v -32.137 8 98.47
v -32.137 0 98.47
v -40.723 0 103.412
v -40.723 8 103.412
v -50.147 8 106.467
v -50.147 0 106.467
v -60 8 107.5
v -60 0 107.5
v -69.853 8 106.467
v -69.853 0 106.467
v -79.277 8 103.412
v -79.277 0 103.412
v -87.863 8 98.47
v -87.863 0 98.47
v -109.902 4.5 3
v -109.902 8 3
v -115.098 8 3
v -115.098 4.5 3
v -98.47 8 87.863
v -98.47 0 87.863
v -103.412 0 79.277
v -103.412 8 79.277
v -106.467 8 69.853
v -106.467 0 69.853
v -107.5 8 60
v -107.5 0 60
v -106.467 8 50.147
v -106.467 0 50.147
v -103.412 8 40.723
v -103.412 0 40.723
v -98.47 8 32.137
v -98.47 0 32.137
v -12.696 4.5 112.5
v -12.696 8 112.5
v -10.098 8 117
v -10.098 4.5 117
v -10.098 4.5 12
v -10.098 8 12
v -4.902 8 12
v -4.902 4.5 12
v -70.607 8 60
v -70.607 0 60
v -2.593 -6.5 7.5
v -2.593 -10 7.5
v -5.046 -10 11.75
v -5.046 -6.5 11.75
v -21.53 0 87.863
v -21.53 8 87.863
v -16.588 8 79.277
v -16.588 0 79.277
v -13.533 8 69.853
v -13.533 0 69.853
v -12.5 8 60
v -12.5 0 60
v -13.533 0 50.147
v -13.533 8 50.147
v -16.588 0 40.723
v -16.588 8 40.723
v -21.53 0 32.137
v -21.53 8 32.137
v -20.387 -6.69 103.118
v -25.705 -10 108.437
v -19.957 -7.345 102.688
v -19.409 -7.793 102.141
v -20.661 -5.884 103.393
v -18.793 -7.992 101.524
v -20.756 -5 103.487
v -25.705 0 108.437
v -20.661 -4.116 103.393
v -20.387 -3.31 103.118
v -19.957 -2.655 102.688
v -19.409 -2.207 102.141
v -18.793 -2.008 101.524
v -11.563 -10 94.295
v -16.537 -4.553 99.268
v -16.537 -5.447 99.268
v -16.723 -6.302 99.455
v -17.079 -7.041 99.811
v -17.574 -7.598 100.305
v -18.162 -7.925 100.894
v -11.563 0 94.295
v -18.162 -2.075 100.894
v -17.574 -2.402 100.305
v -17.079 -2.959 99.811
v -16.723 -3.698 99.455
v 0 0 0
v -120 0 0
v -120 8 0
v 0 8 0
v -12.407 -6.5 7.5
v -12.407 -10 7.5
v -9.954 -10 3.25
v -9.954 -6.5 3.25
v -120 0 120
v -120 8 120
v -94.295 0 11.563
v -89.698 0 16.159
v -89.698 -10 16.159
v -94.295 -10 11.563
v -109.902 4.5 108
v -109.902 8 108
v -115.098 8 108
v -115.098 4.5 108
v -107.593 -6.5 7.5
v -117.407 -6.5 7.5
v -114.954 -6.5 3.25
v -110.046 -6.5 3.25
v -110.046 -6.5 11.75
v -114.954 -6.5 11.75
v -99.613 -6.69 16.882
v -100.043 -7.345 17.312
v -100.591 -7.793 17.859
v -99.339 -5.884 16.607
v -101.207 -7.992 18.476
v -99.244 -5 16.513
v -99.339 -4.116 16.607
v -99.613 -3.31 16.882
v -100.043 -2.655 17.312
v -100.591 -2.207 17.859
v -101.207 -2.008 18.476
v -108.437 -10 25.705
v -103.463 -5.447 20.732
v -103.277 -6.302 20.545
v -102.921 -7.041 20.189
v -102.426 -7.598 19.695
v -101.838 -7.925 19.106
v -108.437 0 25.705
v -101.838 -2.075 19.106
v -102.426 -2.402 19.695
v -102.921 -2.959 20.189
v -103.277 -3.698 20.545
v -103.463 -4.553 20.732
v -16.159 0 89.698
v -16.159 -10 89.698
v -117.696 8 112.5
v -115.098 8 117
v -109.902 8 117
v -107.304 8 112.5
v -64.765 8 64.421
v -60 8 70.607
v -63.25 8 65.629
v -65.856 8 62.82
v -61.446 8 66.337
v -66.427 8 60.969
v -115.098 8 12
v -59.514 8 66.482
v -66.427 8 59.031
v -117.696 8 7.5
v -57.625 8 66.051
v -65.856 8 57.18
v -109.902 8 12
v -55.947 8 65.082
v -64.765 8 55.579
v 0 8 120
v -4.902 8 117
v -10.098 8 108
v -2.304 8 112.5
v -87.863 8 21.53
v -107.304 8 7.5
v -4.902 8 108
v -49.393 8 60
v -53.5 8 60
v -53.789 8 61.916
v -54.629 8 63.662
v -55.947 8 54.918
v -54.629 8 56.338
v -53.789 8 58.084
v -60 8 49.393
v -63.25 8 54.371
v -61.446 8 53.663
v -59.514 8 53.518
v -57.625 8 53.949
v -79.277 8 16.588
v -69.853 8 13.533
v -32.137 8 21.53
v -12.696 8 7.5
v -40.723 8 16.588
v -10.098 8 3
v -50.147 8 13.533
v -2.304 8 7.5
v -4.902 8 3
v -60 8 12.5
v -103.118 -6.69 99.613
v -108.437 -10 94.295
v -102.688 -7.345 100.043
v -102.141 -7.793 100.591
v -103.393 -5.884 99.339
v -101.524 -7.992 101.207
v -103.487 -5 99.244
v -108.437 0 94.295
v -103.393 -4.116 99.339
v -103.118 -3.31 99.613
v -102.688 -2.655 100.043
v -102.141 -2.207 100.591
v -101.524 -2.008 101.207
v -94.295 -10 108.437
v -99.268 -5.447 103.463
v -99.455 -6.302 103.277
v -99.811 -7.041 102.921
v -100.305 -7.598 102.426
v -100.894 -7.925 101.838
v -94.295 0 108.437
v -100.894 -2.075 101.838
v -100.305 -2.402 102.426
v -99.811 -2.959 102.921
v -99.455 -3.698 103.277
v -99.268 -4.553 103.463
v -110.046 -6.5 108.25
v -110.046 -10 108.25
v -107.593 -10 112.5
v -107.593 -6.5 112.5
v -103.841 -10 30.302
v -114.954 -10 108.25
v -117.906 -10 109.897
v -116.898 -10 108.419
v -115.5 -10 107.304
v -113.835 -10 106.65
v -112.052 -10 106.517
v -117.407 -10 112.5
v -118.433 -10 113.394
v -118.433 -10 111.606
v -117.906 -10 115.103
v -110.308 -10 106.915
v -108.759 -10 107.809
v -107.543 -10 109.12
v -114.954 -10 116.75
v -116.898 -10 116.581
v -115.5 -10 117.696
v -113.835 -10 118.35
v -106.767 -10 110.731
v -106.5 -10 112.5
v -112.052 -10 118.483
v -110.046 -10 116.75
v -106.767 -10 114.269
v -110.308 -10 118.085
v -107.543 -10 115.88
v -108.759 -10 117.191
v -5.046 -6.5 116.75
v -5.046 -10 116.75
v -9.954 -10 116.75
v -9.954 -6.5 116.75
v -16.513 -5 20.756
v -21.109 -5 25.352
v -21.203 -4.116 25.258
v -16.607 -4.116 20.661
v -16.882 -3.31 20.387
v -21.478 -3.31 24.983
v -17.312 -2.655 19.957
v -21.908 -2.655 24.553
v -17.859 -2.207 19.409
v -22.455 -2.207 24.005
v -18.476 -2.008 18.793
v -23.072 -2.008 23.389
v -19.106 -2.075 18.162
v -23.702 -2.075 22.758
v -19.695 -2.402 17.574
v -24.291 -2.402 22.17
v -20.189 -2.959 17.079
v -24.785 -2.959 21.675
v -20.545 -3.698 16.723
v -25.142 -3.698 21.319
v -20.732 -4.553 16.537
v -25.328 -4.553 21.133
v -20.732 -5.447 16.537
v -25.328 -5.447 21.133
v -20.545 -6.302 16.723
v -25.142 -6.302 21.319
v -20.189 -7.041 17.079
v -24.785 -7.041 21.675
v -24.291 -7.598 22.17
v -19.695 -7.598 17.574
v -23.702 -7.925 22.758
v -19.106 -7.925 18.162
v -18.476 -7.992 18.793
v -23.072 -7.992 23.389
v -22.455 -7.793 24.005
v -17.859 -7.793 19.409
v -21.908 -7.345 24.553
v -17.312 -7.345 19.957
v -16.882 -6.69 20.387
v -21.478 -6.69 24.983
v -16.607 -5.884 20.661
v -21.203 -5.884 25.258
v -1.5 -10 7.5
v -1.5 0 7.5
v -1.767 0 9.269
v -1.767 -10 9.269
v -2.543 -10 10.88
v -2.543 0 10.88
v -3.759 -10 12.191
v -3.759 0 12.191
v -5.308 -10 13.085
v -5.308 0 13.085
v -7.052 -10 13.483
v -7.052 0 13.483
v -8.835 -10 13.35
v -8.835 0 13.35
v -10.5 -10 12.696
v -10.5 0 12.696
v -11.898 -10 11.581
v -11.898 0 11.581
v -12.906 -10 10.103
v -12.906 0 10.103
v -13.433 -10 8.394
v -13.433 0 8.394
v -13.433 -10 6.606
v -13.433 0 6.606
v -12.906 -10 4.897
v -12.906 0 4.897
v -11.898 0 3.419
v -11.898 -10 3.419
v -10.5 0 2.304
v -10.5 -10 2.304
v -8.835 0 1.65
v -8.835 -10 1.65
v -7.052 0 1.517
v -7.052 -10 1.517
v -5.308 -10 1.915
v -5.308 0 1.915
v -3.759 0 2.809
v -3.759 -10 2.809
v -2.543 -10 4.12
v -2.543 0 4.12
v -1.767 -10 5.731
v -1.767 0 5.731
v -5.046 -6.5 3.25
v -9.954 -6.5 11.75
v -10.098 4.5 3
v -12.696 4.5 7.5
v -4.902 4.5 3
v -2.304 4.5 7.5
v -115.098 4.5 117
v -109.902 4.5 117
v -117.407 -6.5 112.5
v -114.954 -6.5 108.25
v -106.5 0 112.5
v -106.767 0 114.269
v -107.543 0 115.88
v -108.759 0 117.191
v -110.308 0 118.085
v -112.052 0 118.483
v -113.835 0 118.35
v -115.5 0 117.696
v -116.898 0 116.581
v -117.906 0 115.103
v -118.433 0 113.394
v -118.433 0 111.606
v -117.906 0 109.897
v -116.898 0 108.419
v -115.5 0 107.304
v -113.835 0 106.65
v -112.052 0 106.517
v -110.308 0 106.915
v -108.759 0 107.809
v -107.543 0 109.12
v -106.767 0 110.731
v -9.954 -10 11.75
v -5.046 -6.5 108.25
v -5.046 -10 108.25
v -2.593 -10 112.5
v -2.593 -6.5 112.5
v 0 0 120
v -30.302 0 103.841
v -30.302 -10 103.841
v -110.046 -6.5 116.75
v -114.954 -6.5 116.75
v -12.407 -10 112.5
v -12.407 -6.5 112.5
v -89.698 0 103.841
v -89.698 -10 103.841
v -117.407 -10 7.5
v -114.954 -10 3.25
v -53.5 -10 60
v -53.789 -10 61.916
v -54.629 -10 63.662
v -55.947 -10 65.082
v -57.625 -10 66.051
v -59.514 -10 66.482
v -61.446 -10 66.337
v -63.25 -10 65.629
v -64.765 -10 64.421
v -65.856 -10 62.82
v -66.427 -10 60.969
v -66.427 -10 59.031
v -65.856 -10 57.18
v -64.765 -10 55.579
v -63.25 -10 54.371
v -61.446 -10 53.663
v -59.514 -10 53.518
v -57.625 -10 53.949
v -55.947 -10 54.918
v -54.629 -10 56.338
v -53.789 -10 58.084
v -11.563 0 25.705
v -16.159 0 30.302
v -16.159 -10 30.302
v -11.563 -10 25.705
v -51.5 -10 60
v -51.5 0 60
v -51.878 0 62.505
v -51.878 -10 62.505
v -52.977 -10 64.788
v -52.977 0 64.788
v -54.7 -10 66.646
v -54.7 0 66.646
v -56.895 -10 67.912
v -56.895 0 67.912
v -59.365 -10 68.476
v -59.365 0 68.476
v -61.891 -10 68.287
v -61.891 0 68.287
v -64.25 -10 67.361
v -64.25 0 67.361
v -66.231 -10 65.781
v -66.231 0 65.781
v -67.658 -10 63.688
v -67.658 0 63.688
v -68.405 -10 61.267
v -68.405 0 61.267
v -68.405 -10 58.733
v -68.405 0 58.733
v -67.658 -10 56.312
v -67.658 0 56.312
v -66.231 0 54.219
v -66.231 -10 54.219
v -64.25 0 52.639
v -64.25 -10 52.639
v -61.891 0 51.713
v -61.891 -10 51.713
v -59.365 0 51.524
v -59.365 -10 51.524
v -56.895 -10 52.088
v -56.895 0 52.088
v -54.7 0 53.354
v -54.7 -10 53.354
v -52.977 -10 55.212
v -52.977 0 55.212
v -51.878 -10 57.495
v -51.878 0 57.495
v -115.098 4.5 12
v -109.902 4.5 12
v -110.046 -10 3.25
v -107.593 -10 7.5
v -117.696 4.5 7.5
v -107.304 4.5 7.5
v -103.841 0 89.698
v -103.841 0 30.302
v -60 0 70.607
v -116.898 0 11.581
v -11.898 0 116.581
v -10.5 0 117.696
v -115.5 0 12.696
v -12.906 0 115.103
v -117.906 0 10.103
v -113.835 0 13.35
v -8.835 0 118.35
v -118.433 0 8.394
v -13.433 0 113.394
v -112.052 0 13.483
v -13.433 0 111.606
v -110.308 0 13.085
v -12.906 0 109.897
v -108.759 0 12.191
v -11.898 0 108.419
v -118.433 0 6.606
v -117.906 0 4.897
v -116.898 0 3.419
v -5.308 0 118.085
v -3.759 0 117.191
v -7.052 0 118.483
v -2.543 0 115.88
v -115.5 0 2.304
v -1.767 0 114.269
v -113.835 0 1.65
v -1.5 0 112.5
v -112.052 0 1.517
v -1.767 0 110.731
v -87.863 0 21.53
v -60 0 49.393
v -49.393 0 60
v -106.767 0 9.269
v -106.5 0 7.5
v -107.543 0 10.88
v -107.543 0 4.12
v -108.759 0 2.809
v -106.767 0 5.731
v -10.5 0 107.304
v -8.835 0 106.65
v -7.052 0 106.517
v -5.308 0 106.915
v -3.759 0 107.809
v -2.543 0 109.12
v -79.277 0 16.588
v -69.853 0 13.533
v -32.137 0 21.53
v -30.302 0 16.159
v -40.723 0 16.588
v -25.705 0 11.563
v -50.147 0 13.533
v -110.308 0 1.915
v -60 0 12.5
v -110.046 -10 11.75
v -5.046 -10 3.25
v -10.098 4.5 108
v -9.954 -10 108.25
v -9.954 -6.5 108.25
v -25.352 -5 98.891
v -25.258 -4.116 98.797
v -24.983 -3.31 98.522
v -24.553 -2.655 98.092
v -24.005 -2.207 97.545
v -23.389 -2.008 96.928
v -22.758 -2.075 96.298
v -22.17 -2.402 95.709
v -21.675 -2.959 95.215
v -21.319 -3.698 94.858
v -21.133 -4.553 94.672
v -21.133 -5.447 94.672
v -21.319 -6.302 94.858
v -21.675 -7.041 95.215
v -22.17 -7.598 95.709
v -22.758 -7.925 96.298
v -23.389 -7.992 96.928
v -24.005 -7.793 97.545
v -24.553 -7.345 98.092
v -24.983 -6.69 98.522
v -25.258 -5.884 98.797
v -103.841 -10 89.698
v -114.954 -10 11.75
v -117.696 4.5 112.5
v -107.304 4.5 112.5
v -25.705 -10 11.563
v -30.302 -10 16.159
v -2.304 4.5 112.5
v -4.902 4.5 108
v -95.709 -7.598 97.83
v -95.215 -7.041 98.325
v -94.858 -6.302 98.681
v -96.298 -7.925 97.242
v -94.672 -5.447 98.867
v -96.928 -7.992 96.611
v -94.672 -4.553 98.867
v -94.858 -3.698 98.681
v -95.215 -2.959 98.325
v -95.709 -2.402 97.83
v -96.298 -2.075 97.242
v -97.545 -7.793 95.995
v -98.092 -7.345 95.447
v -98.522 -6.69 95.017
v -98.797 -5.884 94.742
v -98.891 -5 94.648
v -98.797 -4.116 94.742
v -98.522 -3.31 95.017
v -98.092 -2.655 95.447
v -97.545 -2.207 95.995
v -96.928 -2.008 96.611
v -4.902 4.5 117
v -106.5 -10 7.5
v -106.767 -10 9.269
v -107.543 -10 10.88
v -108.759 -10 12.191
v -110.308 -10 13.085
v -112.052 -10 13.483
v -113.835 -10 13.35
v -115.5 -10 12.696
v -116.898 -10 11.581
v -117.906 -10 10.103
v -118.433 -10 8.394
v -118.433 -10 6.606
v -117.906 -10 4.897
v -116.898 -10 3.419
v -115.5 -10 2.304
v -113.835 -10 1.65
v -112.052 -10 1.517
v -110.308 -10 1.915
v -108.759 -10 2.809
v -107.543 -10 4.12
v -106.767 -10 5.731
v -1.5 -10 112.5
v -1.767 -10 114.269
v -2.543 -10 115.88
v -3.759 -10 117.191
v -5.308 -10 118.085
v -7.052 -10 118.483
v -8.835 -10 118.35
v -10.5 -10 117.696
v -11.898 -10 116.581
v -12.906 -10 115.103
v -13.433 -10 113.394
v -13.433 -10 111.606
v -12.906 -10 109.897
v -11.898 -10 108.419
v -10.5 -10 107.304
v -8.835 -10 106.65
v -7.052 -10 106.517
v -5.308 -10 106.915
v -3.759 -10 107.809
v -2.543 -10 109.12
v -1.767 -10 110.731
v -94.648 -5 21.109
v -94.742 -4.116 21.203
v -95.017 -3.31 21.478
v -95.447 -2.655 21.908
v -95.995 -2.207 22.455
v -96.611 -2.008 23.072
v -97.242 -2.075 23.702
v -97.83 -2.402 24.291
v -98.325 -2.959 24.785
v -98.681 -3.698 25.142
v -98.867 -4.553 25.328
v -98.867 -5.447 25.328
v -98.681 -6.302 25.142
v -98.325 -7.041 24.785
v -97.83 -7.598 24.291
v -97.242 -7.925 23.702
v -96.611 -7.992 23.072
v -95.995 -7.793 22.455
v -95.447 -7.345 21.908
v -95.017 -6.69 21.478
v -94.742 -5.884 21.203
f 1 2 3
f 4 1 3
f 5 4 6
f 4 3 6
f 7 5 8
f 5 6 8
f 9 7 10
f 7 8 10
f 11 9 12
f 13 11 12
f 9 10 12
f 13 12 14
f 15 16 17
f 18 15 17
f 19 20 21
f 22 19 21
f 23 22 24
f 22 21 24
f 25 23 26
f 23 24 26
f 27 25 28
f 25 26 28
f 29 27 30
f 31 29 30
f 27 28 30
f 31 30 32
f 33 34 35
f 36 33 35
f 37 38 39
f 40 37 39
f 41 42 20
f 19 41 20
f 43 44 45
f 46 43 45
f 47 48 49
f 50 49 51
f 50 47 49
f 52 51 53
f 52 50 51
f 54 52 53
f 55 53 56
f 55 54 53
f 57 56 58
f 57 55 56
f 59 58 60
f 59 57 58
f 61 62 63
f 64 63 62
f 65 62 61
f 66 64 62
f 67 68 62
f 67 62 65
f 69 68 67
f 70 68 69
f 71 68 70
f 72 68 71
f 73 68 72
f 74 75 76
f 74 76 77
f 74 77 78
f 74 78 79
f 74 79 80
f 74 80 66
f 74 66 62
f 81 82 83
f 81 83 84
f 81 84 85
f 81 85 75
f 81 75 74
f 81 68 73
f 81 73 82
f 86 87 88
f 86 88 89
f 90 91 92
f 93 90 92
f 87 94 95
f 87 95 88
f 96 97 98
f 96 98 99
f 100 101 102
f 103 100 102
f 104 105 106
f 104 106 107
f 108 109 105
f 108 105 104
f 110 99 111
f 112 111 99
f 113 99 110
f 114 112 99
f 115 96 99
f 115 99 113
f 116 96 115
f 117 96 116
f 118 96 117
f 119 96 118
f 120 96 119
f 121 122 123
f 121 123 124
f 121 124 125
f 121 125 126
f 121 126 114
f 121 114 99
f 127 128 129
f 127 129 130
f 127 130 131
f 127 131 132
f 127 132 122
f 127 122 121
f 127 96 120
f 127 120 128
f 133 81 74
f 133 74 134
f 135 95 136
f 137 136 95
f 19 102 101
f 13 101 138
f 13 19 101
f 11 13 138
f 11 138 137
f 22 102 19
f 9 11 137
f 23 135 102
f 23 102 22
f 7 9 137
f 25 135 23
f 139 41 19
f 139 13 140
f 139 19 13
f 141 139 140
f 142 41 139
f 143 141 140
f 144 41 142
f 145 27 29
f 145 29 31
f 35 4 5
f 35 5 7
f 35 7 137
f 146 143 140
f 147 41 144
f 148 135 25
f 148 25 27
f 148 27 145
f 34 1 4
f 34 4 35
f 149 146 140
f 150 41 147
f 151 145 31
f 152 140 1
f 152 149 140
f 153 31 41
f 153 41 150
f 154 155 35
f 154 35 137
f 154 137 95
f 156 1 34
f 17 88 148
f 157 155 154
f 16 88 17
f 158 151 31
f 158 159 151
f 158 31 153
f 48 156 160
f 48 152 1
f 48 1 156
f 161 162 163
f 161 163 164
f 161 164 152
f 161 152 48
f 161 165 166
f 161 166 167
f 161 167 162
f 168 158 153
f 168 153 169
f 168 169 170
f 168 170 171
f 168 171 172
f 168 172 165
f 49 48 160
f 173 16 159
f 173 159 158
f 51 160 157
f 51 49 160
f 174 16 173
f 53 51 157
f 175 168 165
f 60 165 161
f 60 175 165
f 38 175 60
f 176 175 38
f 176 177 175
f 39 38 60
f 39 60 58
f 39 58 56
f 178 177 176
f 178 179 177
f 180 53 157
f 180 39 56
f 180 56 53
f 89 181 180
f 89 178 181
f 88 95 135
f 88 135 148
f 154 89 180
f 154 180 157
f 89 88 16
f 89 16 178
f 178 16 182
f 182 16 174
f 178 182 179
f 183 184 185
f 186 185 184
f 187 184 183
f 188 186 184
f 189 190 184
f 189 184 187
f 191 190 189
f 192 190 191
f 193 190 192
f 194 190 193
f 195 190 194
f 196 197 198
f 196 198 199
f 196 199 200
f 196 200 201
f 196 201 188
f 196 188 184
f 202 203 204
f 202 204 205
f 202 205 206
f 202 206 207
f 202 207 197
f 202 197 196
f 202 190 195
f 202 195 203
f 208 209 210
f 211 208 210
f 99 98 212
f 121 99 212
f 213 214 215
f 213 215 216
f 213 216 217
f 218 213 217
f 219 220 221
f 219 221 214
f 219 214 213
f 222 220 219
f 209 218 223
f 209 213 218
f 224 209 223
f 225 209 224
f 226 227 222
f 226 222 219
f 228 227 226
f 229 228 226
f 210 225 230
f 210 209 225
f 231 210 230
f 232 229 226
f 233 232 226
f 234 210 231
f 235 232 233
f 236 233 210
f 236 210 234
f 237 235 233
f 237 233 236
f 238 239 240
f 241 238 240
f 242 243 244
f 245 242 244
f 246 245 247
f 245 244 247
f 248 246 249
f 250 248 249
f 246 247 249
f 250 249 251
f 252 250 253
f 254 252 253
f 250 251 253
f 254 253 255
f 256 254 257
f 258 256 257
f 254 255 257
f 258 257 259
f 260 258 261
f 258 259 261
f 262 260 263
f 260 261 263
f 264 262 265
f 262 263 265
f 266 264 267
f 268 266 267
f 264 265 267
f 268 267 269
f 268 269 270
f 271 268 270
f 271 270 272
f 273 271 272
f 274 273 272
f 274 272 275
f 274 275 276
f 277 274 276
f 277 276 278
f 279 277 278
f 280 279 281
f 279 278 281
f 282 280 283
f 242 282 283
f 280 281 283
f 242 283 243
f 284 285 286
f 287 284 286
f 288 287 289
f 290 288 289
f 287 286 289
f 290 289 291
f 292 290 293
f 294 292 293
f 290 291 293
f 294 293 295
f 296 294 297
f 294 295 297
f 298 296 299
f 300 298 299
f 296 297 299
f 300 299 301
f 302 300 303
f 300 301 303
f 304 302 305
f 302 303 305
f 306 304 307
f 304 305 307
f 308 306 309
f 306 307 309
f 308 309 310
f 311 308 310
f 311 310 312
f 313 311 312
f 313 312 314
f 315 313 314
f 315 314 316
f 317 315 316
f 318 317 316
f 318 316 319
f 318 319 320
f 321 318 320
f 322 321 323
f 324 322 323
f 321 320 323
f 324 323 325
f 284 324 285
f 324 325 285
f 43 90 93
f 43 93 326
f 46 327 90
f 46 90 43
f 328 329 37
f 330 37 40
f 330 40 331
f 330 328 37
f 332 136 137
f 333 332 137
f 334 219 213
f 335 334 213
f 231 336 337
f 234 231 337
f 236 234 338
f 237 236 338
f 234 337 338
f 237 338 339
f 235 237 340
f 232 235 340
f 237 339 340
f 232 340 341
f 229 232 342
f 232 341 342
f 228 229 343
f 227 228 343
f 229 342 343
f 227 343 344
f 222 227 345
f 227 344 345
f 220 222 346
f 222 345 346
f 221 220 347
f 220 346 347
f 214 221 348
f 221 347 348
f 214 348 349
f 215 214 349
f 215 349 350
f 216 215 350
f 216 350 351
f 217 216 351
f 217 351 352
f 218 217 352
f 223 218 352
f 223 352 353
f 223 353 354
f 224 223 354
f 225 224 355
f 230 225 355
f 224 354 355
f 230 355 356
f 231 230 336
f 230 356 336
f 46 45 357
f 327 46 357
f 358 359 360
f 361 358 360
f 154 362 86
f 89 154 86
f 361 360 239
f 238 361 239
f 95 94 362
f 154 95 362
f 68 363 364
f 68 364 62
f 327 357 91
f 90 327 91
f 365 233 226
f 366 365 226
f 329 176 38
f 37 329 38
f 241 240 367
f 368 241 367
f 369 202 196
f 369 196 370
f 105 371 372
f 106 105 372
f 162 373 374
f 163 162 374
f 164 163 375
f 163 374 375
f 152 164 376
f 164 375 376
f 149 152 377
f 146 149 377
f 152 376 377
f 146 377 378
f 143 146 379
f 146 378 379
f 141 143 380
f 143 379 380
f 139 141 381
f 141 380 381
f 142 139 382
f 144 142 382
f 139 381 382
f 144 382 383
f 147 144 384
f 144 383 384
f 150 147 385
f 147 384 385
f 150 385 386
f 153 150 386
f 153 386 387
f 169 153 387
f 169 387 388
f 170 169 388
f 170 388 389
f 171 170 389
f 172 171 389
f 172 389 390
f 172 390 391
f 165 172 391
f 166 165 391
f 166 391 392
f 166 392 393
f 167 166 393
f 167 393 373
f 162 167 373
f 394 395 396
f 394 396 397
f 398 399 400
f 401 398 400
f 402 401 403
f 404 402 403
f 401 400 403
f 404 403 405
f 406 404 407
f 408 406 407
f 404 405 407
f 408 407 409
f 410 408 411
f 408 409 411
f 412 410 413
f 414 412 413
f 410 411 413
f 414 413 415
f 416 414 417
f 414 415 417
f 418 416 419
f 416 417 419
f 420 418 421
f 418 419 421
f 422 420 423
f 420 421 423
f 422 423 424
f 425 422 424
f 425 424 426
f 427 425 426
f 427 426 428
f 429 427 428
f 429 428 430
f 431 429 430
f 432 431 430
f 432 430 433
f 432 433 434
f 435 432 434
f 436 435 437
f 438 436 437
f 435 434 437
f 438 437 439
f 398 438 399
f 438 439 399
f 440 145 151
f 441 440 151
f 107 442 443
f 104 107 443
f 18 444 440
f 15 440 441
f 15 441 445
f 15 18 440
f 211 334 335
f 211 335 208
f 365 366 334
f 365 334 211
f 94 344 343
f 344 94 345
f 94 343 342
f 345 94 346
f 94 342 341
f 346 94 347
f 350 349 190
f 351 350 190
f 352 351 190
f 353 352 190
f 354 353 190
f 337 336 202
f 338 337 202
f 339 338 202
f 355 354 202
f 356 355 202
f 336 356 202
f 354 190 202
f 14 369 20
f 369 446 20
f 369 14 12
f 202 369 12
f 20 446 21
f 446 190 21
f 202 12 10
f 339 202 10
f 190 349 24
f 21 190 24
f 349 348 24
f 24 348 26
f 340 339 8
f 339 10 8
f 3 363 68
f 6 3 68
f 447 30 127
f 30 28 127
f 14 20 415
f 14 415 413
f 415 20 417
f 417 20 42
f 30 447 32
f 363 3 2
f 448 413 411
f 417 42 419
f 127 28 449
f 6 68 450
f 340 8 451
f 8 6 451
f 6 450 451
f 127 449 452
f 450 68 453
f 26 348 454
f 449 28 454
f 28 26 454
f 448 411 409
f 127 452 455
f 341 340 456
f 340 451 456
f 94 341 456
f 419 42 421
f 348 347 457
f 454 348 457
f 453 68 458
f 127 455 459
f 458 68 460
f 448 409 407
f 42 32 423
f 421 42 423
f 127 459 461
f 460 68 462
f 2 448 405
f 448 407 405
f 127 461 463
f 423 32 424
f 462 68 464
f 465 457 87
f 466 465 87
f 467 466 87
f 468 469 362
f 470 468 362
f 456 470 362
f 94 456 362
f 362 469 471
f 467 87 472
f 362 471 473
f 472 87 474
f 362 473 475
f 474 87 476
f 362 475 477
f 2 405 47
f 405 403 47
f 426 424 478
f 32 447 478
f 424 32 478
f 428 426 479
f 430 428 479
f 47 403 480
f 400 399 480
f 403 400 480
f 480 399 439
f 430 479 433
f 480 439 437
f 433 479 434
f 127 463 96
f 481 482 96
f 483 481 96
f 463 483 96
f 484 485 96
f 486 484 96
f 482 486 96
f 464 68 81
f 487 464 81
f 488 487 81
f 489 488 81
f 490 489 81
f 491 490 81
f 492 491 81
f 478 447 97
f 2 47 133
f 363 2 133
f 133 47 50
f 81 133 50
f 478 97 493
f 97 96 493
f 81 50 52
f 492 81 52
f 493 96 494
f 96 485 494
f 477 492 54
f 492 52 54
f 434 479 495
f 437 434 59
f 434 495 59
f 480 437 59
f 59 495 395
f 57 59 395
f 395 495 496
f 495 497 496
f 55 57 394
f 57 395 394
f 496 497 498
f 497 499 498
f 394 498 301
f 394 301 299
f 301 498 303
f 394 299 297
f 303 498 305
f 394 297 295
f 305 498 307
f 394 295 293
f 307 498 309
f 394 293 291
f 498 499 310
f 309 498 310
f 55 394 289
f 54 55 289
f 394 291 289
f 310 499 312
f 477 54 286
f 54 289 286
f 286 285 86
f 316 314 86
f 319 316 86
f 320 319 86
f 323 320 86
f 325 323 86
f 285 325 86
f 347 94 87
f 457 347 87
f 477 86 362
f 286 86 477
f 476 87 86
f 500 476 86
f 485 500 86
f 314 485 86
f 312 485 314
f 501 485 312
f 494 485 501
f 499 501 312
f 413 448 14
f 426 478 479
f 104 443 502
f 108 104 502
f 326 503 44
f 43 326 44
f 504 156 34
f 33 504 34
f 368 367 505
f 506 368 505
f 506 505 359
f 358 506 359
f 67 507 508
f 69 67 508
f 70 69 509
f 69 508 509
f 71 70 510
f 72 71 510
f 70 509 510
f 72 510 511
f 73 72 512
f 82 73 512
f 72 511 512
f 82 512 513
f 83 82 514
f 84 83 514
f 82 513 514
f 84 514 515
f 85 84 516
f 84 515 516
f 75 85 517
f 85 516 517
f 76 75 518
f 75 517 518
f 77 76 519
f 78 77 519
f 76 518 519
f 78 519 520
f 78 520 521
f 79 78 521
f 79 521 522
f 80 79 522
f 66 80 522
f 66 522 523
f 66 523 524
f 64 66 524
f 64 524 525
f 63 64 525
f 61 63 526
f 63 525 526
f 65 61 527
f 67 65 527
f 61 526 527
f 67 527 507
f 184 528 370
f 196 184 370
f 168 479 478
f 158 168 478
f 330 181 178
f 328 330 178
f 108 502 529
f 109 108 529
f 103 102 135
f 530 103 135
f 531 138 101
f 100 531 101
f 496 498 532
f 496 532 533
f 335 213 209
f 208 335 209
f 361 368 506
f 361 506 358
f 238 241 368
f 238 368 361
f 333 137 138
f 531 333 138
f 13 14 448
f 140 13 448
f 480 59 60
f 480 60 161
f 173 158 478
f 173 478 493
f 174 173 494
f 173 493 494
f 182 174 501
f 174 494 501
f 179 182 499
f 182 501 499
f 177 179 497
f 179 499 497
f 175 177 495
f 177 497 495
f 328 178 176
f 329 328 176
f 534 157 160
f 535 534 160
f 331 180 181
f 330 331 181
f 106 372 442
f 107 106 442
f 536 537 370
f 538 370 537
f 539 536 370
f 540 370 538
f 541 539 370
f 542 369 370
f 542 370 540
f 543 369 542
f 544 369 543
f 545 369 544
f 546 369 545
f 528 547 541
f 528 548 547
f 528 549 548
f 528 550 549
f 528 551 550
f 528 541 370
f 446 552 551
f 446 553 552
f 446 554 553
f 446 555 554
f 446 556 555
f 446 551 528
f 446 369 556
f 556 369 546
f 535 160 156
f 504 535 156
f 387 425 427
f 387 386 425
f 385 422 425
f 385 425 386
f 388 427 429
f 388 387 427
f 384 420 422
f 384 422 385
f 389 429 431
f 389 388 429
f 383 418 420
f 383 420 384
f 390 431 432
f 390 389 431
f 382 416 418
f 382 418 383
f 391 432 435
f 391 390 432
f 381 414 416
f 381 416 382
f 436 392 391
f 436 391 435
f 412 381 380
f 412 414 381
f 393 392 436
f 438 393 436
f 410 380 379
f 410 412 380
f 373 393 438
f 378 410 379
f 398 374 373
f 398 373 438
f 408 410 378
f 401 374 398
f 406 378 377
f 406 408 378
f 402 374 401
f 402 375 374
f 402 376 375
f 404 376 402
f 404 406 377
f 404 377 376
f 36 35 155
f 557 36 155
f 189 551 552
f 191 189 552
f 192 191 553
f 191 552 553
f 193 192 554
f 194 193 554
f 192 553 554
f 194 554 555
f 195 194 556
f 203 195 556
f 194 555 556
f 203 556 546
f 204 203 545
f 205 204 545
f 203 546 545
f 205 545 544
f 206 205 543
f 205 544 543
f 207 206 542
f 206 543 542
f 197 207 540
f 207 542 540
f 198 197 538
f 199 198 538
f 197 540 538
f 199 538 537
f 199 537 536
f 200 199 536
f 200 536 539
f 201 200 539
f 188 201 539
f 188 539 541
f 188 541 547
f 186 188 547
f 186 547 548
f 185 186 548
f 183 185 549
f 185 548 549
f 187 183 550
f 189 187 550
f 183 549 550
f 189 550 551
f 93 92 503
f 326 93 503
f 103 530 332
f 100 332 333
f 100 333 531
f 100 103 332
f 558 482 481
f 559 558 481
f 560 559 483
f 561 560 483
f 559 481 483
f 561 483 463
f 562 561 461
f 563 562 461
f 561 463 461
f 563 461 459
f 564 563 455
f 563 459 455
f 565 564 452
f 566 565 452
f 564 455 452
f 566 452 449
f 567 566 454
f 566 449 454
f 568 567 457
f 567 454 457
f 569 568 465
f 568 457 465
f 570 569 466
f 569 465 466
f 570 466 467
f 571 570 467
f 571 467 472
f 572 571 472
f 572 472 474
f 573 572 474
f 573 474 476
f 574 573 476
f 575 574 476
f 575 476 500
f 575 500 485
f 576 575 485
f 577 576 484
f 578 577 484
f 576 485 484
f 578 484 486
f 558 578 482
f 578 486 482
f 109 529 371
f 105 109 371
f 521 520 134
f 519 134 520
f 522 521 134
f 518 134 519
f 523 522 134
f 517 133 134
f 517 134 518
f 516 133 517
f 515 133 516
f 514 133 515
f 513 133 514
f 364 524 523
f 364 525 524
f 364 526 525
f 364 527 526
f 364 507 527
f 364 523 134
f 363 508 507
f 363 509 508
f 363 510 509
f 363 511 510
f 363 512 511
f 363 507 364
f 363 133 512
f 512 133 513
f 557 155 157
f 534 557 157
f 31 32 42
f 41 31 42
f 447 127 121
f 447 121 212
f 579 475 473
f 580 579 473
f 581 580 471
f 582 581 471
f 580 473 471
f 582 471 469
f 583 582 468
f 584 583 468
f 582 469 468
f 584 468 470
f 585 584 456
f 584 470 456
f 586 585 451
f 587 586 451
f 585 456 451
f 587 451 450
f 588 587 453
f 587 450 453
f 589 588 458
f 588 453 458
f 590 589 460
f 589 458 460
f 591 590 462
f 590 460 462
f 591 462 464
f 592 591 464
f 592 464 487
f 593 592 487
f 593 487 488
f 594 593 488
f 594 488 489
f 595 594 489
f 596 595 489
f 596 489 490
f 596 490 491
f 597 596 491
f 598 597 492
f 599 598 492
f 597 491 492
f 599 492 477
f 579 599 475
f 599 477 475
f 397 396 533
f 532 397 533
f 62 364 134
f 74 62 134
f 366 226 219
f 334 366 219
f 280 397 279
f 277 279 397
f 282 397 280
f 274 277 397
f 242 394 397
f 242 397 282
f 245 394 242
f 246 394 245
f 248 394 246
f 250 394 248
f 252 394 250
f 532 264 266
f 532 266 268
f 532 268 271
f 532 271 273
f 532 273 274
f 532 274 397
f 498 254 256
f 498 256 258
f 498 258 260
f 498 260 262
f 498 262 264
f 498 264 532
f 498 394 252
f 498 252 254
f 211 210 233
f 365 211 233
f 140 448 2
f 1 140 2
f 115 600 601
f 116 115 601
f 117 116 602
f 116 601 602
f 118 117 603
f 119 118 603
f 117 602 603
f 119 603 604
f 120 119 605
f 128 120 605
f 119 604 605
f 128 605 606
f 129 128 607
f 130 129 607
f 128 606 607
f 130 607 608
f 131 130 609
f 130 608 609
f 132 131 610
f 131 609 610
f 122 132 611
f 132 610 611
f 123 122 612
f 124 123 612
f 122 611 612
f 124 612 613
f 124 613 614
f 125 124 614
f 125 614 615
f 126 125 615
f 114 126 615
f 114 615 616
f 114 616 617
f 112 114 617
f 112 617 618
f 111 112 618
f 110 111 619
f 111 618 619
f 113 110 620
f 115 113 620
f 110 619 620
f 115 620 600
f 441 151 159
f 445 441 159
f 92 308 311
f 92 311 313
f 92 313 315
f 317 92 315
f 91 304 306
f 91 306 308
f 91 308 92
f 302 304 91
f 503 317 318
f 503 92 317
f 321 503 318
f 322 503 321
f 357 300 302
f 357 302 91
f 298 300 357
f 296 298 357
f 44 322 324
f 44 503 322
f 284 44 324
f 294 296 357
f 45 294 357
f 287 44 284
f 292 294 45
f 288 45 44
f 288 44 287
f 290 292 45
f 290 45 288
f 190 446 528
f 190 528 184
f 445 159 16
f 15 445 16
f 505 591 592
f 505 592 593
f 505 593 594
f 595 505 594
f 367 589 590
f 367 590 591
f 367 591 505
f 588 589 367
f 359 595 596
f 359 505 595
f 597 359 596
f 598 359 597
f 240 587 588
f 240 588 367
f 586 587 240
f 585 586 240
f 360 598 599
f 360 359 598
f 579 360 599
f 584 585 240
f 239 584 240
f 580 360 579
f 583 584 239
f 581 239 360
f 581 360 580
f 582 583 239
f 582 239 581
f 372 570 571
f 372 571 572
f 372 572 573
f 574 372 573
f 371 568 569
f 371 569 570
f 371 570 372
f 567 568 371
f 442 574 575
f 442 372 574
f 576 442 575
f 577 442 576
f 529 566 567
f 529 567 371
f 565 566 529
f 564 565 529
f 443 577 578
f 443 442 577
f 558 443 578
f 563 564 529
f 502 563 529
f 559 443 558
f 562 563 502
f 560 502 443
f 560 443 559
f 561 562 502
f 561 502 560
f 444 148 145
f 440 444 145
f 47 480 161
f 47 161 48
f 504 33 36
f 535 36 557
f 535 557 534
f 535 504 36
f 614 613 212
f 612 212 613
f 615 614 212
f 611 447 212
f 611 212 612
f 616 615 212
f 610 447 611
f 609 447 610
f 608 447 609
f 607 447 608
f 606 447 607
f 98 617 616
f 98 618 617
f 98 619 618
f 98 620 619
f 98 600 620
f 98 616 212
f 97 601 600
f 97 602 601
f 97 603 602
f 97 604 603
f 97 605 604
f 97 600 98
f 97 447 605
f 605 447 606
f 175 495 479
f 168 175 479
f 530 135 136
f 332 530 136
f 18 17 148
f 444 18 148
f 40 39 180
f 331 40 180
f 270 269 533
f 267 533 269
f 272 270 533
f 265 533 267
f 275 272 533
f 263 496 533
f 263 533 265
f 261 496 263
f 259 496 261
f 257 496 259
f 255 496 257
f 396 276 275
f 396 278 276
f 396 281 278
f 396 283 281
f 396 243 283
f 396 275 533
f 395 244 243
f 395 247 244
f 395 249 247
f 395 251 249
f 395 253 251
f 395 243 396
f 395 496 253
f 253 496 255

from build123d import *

# Parameters (mm, degrees)
SKETCH2_W            = 120
SKETCH2_H            = 120
BOSS_EXTRUDE1_DEPTH  = 8
CUT_EXTRUDE1_DEPTH   = 3.5
LPATTERN1_COUNT      = 2
LPATTERN1_PITCH      = 105
LPATTERN1_COUNT_DIR2 = 2
LPATTERN1_PITCH_DIR2 = 105
AIR_HOLES_REACH      = 10
HEATER_MOUNTS_DEPTH  = 10
SKETCH14_R           = 3
HEATER_HOLES_DEPTH   = 6.5
CIRPATTERN2_COUNT    = 4
SKETCH11_R           = 8.5
BOSS_EXTRUDE3_DEPTH  = 10
CUT_EXTRUDE9_REACH   = 20
SKETCH16_R           = 6.5
SKETCH17_R           = 6
BOSS_EXTRUDE4_DEPTH  = 10
CUT_EXTRUDE10_DEPTH  = 3.5
LPATTERN4_COUNT      = 2
LPATTERN4_PITCH      = 105
LPATTERN4_COUNT_DIR2 = 2
LPATTERN4_PITCH_DIR2 = 105


with BuildPart() as part:
    # Sketch2 → Boss-Extrude1 (new body)
    with BuildSketch(Plane(origin=(0, 0, 0), x_dir=(1, 0, 0), z_dir=(0, 1, 0))):
        with Locations((-60, -60)):
            Rectangle(SKETCH2_W, SKETCH2_H)
    extrude(amount=BOSS_EXTRUDE1_DEPTH)

    # Sketch3 → Cut-Extrude1 (cut)
    with BuildSketch(Plane(origin=(0, 8, 0), x_dir=(1, 0, 0), z_dir=(0, 1, 0))):
        Polygon((-2.303847577, -112.5), (-4.901923789, -108), (-10.098076211, -108), (-12.696152423, -112.5), (-10.098076211, -117), (-4.901923789, -117), align=None)
    cut_extrude1 = extrude(amount=-CUT_EXTRUDE1_DEPTH, mode=Mode.SUBTRACT)

    # LPattern1: Cut-Extrude1 2 × 2
    with Locations(*[(-i * LPATTERN1_PITCH, 0, -j * LPATTERN1_PITCH_DIR2) for i in range(LPATTERN1_COUNT) for j in range(LPATTERN1_COUNT_DIR2) if (i, j) != (0, 0)]):
        add(cut_extrude1, mode=Mode.SUBTRACT)

    # Sketch8 → air holes (cut, up to next)
    with BuildSketch(Plane.XZ, mode=Mode.PRIVATE) as air_holes_sk1:
        with BuildLine():
            Line((-49.393398282, 60), (-21.530451238, 87.862947045))
            ThreePointArc((-21.530451238, 87.862947045), (-12.5, 60), (-21.530451238, 32.137052955))
            Line((-21.530451238, 32.137052955), (-49.393398282, 60))
        make_face()
    air_holes_tool1 = extrude(air_holes_sk1.sketch, amount=-AIR_HOLES_REACH, mode=Mode.PRIVATE) & part.part
    add(air_holes_tool1.solids().sort_by_distance((-26.860216, 0, 60))[0], mode=Mode.SUBTRACT)
    # Sketch8 → air holes (cut, up to next)
    with BuildSketch(Plane.XZ, mode=Mode.PRIVATE) as air_holes_sk2:
        with BuildLine():
            Line((-32.137052955, 21.530451238), (-60, 49.393398282))
            Line((-60, 49.393398282), (-87.862947045, 21.530451238))
            ThreePointArc((-87.862947045, 21.530451238), (-60, 12.5), (-32.137052955, 21.530451238))
        make_face()
    air_holes_tool2 = extrude(air_holes_sk2.sketch, amount=-AIR_HOLES_REACH, mode=Mode.PRIVATE) & part.part
    add(air_holes_tool2.solids().sort_by_distance((-60, 0, 26.860216))[0], mode=Mode.SUBTRACT)
    # Sketch8 → air holes (cut, up to next)
    with BuildSketch(Plane.XZ, mode=Mode.PRIVATE) as air_holes_sk3:
        with BuildLine():
            Line((-98.469548762, 32.137052955), (-70.606601718, 60))
            Line((-70.606601718, 60), (-98.469548762, 87.862947045))
            ThreePointArc((-98.469548762, 87.862947045), (-107.5, 60), (-98.469548762, 32.137052955))
        make_face()
    air_holes_tool3 = extrude(air_holes_sk3.sketch, amount=-AIR_HOLES_REACH, mode=Mode.PRIVATE) & part.part
    add(air_holes_tool3.solids().sort_by_distance((-93.139784, 0, 60))[0], mode=Mode.SUBTRACT)
    # Sketch8 → air holes (cut, up to next)
    with BuildSketch(Plane.XZ, mode=Mode.PRIVATE) as air_holes_sk4:
        with BuildLine():
            Line((-60, 70.606601718), (-32.137052955, 98.469548762))
            ThreePointArc((-32.137052955, 98.469548762), (-60, 107.5), (-87.862947045, 98.469548762))
            Line((-87.862947045, 98.469548762), (-60, 70.606601718))
        make_face()
    air_holes_tool4 = extrude(air_holes_sk4.sketch, amount=-AIR_HOLES_REACH, mode=Mode.PRIVATE) & part.part
    add(air_holes_tool4.solids().sort_by_distance((-60, 0, 93.139784))[0], mode=Mode.SUBTRACT)

    # Sketch13 → heater_mounts (add)
    with BuildSketch(Plane.XZ):
        Polygon((-16.159379566, 30.30151519), (-11.563185489, 25.705321112), (-25.705321112, 11.563185489), (-30.30151519, 16.159379566), align=None)
    heater_mounts = extrude(amount=HEATER_MOUNTS_DEPTH)

    # Sketch14 → heater_holes (cut)
    with BuildSketch(Plane(origin=(-23.230447378, 0, 23.230447378), x_dir=(0.707106781, 0, 0.707106781), z_dir=(-0.707106781, 0, 0.707106781))):
        with Locations((0, -5)):
            Circle(SKETCH14_R)
    heater_holes = extrude(amount=-HEATER_HOLES_DEPTH, mode=Mode.SUBTRACT)

    # CirPattern2: heater_mounts, heater_holes ×4 about axis
    cirpattern2_axis = Axis((-60, 0, 60), (0, 1, 0))
    for i in range(1, CIRPATTERN2_COUNT):
        add(heater_mounts.rotate(cirpattern2_axis, i * 360 / CIRPATTERN2_COUNT))
        add(heater_holes.rotate(cirpattern2_axis, i * 360 / CIRPATTERN2_COUNT), mode=Mode.SUBTRACT)

    # Sketch11 → Boss-Extrude3 (add)
    with BuildSketch(Plane.XZ):
        with Locations((-60, 60)):
            Circle(SKETCH11_R)
    extrude(amount=BOSS_EXTRUDE3_DEPTH)

    # Sketch16 → Cut-Extrude9 (cut, up to next)
    with BuildSketch(Plane.XZ.offset(10), mode=Mode.PRIVATE) as cut_extrude9_sk1:
        with Locations((-60, 60)):
            Circle(SKETCH16_R)
    cut_extrude9_tool1 = extrude(cut_extrude9_sk1.sketch, amount=-CUT_EXTRUDE9_REACH, mode=Mode.PRIVATE) & part.part
    add(cut_extrude9_tool1.solids().sort_by_distance((-60, -10, 60))[0], mode=Mode.SUBTRACT)

    # Sketch17 → Boss-Extrude4 (add)
    with BuildSketch(Plane.XZ):
        with Locations((-112.5, 112.5)):
            Circle(SKETCH17_R)
    boss_extrude4 = extrude(amount=BOSS_EXTRUDE4_DEPTH)

    # Sketch18 → Cut-Extrude10 (cut)
    with BuildSketch(Plane.XZ.offset(10)):
        Polygon((-117.407477288, 112.5), (-114.953738644, 108.25), (-110.046261356, 108.25), (-107.592522712, 112.5), (-110.046261356, 116.75), (-114.953738644, 116.75), align=None)
    cut_extrude10 = extrude(amount=-CUT_EXTRUDE10_DEPTH, mode=Mode.SUBTRACT)

    # LPattern4: Boss-Extrude4, Cut-Extrude10 2 × 2
    with Locations(*[(i * LPATTERN4_PITCH, 0, -j * LPATTERN4_PITCH_DIR2) for i in range(LPATTERN4_COUNT) for j in range(LPATTERN4_COUNT_DIR2) if (i, j) != (0, 0)]):
        add(boss_extrude4)
        add(cut_extrude10, mode=Mode.SUBTRACT)


solid = part.part
